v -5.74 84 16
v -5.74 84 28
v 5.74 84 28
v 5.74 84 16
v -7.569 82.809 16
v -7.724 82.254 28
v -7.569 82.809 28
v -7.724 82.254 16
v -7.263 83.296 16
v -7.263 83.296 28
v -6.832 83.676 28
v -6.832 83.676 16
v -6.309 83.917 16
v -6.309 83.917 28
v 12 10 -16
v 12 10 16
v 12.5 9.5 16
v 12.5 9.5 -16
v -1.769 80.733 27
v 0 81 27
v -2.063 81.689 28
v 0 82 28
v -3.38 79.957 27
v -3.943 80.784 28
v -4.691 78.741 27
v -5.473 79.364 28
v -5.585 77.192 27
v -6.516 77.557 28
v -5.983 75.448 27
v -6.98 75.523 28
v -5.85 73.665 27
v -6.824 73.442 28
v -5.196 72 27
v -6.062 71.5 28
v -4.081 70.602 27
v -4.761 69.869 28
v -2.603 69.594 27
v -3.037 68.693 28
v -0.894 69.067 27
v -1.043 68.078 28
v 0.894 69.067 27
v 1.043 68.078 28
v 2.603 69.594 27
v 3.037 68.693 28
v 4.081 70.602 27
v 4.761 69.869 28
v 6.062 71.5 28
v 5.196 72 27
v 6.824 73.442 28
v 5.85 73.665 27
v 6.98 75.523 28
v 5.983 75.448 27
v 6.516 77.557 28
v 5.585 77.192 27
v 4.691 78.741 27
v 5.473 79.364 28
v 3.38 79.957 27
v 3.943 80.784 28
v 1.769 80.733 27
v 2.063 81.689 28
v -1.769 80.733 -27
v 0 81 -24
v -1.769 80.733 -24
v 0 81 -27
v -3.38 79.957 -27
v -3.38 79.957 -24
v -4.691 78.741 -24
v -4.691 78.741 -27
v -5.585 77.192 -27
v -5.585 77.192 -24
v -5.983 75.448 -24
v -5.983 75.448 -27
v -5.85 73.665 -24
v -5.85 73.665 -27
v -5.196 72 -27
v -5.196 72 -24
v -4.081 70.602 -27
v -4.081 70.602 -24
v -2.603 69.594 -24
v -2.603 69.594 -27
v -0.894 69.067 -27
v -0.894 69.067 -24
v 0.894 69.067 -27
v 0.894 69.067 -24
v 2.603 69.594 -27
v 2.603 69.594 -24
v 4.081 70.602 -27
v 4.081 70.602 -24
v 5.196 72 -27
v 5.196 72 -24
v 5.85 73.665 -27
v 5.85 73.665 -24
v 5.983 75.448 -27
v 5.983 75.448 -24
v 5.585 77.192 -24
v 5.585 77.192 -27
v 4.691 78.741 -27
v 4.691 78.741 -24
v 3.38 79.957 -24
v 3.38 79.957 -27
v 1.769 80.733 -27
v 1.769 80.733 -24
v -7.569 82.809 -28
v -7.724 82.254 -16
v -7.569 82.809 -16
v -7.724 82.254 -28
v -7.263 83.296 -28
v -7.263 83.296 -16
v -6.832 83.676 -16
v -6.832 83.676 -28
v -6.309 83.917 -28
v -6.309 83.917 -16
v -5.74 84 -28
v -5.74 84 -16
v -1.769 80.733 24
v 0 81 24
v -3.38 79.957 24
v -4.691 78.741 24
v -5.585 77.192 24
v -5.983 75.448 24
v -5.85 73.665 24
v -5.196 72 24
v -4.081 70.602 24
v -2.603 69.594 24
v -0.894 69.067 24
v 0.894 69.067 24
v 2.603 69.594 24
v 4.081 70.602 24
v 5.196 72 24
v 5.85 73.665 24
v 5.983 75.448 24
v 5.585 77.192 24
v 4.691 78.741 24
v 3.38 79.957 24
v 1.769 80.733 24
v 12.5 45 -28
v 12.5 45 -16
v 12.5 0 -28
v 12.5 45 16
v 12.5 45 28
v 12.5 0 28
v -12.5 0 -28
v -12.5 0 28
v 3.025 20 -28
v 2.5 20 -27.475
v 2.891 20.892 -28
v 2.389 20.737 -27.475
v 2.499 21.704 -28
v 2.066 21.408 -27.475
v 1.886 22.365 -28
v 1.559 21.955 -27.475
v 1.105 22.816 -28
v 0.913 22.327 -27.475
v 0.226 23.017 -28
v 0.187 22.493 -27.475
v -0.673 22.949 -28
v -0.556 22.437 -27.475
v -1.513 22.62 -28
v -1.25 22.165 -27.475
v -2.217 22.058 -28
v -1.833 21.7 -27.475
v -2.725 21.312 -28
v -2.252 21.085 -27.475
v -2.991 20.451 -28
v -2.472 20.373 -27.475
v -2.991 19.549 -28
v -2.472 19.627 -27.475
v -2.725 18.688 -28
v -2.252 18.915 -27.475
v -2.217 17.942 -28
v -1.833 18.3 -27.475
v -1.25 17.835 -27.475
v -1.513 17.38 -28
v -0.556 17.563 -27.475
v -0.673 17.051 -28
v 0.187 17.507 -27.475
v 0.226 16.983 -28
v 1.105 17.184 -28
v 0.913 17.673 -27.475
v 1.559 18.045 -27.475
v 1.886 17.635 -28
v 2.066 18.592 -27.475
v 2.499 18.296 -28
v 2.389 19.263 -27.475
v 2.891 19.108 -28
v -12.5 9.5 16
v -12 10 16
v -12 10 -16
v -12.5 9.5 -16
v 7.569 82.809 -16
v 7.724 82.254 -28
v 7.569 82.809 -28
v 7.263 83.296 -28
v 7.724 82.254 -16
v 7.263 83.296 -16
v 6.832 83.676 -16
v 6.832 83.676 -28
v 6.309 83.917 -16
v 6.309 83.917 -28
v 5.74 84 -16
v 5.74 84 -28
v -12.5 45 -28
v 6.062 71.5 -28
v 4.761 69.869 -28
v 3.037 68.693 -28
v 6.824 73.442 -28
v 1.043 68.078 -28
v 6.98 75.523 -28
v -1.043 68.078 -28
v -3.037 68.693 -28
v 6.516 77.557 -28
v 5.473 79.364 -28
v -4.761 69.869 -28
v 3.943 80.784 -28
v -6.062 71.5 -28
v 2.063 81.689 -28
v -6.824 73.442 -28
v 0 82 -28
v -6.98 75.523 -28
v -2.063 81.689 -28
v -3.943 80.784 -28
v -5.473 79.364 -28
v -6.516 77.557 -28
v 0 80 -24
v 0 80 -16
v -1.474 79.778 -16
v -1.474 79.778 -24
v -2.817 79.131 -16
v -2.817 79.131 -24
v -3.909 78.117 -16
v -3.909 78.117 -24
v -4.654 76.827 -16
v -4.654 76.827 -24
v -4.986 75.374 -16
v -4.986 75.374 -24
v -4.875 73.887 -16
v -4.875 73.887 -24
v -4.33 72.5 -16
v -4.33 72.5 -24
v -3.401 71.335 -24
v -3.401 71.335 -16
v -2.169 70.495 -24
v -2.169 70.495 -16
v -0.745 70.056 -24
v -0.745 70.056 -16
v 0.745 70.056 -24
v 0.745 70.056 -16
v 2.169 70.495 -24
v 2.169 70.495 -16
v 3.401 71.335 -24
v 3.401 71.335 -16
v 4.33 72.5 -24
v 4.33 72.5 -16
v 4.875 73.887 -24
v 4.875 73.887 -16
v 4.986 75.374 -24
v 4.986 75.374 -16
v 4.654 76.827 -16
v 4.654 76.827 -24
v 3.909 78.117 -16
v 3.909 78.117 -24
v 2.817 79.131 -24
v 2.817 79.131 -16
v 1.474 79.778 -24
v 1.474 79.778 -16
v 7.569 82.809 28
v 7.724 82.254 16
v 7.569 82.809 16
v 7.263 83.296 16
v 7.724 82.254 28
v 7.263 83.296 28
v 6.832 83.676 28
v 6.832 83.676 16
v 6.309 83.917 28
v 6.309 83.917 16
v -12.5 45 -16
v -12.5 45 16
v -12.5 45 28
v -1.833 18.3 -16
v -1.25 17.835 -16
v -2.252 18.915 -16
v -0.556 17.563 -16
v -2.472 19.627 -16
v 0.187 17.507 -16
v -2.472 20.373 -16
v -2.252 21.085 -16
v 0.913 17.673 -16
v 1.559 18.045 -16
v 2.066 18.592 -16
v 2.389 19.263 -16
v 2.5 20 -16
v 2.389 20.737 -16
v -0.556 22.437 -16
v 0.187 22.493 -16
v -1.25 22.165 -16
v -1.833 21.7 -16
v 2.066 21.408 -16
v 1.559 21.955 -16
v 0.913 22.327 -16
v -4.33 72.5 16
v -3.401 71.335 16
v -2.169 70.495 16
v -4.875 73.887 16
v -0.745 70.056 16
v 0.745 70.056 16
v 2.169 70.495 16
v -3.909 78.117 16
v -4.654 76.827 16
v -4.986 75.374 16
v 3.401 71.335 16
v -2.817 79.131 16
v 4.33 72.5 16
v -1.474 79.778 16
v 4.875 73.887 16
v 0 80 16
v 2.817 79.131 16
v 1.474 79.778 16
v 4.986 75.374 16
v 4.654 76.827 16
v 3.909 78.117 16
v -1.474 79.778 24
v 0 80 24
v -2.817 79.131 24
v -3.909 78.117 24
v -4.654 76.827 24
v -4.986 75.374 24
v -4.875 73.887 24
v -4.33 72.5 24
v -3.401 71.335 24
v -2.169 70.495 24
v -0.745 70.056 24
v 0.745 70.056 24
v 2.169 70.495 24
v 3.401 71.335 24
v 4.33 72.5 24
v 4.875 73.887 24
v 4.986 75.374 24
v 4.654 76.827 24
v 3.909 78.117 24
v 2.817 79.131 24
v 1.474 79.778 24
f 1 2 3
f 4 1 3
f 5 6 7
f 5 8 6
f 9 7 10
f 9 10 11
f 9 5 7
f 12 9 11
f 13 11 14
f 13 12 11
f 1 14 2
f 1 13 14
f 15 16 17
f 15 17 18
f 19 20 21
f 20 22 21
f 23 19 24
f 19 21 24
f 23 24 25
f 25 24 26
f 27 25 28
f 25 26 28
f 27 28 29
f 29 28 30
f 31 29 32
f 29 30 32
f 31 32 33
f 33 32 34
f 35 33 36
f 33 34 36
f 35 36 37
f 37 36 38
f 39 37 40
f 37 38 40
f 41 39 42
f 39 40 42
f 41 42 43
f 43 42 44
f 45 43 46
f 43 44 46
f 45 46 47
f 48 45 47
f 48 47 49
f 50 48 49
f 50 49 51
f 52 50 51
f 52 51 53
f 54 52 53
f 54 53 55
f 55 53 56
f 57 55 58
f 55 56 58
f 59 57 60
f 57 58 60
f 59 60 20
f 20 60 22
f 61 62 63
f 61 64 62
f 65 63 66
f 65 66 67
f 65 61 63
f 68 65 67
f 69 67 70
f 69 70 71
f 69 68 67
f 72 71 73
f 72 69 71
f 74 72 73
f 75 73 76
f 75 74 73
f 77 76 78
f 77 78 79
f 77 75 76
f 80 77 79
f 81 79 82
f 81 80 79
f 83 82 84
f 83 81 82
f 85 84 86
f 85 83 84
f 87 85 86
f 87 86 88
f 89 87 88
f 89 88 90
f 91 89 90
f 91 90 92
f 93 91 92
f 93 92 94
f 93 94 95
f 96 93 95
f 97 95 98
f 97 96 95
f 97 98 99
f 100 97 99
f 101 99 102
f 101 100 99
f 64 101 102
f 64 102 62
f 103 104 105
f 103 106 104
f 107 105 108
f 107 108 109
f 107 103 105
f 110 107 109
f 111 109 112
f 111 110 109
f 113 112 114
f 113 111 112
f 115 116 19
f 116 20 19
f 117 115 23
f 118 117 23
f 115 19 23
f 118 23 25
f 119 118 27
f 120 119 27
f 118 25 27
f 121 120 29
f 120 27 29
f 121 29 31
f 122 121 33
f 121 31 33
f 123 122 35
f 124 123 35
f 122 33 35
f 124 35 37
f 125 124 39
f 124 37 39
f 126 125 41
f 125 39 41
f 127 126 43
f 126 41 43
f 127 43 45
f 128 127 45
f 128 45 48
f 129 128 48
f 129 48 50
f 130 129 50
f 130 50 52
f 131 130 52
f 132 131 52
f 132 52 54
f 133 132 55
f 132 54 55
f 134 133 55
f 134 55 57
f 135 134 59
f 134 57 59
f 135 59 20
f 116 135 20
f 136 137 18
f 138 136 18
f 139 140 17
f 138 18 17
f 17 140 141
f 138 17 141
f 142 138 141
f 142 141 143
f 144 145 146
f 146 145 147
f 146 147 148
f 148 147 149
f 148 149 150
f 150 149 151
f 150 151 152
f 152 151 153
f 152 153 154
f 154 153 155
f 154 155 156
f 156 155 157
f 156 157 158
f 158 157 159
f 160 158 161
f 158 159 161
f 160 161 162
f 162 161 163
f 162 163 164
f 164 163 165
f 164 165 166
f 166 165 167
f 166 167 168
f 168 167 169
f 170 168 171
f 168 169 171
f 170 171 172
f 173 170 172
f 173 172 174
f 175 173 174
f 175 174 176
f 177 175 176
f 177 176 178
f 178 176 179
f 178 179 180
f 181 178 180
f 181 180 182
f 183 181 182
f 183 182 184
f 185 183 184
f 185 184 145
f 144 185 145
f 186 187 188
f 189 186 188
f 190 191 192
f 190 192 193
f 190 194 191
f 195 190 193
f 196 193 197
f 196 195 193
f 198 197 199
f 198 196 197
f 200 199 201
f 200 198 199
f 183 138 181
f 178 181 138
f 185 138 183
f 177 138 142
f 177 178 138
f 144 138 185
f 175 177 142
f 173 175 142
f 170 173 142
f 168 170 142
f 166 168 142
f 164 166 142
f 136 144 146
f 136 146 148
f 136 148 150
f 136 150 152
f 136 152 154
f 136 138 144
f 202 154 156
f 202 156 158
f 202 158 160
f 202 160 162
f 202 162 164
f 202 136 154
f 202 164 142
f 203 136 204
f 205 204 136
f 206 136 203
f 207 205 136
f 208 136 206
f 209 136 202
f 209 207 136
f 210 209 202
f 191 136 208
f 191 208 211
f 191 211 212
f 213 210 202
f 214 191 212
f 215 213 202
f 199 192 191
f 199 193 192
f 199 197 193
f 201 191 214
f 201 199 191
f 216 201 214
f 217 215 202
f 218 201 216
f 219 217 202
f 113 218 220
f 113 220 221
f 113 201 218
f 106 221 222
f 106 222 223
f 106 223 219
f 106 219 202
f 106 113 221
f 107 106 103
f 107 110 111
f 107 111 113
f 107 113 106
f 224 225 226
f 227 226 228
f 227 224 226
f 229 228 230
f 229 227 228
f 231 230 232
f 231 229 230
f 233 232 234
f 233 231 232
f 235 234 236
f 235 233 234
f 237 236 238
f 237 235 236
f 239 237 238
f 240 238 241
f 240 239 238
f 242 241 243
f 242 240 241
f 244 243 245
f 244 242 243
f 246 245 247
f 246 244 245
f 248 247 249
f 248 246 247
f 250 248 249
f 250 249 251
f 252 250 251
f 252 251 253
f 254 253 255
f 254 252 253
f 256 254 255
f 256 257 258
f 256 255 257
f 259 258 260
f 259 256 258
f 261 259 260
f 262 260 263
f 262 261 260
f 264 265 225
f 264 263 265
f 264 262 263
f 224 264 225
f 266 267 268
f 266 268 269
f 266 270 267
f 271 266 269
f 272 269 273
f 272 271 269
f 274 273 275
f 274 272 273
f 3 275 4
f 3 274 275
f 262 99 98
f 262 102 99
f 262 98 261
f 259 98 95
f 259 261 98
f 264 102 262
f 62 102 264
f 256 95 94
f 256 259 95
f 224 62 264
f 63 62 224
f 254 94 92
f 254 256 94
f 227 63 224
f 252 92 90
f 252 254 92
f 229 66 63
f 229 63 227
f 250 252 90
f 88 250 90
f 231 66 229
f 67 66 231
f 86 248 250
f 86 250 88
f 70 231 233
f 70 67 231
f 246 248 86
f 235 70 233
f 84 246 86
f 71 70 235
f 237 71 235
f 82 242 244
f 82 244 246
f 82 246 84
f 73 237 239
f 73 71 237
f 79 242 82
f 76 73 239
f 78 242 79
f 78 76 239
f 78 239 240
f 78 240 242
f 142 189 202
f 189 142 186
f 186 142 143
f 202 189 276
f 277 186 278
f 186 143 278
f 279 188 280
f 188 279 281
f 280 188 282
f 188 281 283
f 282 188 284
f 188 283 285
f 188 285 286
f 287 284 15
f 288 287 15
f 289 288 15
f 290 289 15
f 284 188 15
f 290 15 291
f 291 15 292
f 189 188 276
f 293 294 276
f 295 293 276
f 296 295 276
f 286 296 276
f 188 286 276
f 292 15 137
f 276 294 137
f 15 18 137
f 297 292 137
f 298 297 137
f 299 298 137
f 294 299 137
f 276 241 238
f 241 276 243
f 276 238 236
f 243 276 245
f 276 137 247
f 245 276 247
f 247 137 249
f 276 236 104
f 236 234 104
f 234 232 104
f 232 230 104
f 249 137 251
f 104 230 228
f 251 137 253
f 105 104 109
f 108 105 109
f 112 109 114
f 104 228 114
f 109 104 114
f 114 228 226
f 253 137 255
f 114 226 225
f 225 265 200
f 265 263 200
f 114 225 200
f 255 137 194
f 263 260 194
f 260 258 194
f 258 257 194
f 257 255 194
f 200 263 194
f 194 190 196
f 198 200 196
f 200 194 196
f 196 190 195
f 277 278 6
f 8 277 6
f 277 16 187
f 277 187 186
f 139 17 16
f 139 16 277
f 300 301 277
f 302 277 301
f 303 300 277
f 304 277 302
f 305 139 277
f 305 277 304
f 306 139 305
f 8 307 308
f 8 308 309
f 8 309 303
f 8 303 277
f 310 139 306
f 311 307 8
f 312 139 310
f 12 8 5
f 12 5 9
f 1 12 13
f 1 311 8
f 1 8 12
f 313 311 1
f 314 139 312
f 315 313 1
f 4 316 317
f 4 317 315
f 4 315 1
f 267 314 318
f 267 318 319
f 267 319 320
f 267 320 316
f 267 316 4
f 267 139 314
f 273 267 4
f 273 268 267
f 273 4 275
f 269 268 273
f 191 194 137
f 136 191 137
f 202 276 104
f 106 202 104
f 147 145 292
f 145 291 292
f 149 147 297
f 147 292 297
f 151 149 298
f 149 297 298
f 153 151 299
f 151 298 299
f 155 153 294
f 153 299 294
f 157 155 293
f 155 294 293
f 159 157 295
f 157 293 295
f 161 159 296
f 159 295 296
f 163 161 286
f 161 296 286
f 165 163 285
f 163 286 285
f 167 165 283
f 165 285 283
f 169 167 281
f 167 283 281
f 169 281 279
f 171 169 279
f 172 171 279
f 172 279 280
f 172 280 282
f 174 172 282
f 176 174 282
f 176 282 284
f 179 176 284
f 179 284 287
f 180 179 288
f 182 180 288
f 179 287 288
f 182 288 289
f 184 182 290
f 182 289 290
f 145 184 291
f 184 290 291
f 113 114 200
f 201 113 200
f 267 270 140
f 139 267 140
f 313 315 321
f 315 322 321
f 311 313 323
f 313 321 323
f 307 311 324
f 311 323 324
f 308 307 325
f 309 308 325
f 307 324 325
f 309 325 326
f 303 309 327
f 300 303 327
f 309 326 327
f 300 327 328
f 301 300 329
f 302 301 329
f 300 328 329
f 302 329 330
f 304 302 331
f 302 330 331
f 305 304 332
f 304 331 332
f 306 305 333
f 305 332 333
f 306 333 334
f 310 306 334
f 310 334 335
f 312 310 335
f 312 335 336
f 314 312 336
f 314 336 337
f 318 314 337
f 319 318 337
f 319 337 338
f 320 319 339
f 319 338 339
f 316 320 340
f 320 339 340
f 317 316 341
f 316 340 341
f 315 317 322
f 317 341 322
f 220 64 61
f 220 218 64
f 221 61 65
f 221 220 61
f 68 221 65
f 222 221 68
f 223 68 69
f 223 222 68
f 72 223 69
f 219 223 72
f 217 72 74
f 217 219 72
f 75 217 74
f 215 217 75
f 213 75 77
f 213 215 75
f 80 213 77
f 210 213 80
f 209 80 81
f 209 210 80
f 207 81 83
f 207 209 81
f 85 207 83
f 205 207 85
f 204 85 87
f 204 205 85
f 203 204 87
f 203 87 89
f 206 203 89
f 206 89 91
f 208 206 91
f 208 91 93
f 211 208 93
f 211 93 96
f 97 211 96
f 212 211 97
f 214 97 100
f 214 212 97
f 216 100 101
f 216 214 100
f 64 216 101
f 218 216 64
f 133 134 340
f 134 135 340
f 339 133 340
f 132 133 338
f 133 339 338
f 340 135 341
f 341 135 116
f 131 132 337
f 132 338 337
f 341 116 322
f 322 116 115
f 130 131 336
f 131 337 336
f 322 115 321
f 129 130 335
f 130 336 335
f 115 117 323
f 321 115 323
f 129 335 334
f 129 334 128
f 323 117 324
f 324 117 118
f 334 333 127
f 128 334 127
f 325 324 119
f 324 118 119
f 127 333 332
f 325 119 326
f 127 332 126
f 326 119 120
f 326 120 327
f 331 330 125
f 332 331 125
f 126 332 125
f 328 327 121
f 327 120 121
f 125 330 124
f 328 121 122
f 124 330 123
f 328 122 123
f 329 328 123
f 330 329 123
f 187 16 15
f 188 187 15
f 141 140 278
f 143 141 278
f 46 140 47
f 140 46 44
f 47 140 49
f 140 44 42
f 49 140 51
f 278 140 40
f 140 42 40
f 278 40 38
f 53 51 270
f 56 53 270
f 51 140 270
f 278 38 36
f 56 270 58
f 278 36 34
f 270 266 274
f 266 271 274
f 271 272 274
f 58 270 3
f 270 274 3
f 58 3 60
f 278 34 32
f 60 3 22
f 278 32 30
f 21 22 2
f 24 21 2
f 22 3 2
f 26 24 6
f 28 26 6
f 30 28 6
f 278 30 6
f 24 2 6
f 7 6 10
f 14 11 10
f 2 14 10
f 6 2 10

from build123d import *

# Parameters (mm, degrees)
BOSS_EXTRUDE1_DEPTH         = 28
SKETCH2_W                   = 32
SKETCH2_H                   = 74
CUT_EXTRUDE1_DEPTH          = 56
FILLET1_R                   = 2
CHAMFER1_SIZE               = 0.5
M6_TAPPED_HOLE2_D           = 5
M6_TAPPED_HOLE2_DEPTH       = 27
M6_TAPPED_HOLE2_CSINK_D     = 6.05
M6_TAPPED_HOLE2_CSINK_ANGLE = 90
M6_TAPPED_HOLE2_TIP         = 1.502151548


with BuildPart() as part:
    # Sketch1 → Boss-Extrude1 (new, symmetric)
    with BuildSketch(Plane.XY):
        Polygon((12.5, 0), (-12.5, 0), (-12.5, 45), (-7.5, 84), (7.5, 84), (12.5, 45), align=None)
    extrude(amount=BOSS_EXTRUDE1_DEPTH, both=True)

    # Sketch2 → Cut-Extrude1 (cut)
    with BuildSketch(Plane(origin=(12.5, 0, 0), x_dir=(0, 0, -1), z_dir=(1, 0, 0))):
        with Locations((0, 47)):
            Rectangle(SKETCH2_W, SKETCH2_H)
    extrude(amount=-CUT_EXTRUDE1_DEPTH, mode=Mode.SUBTRACT)

    # Sketch4 → CBORE for M4 Hex Socket Head Cap Screw1 (revolve, cut)
    with BuildSketch(Plane(origin=(0, 75, -28), x_dir=(0, 1, 0), z_dir=(1, 0, 0))):
        Polygon((0, 0), (0, 23.004303095), (5, 20), (5, 4), (6, 4), (6, 1), (7, 0), align=None)
    cbore_for_m4_hex_socket_head_cap_screw1 = revolve(axis=Axis((0, 75, -34.35), (0, 0, 1)), mode=Mode.SUBTRACT)

    # Mirror1: CBORE for M4 Hex Socket Head Cap Screw1 across plane
    add(cbore_for_m4_hex_socket_head_cap_screw1.mirror(Plane.XY), mode=Mode.SUBTRACT)

    # Fillet1
    fillet1_edges = [part.edges().sort_by_distance(p)[0] for p in [
        (-7.5, 84, 22),
        (7.5, 84, 22),
        (-7.5, 84, -22),
        (7.5, 84, -22),
    ]]
    fillet(fillet1_edges, radius=FILLET1_R)

    # Chamfer1
    chamfer1_edges = [part.edges().sort_by_distance(p)[0] for p in [
        (-12.5, 10, 0),
        (12.5, 10, 0),
    ]]
    chamfer(chamfer1_edges, length=CHAMFER1_SIZE)

    # M6 Tapped Hole2
    with Locations(Plane(origin=(0, 0, -28), x_dir=(-1, 0, 0), z_dir=(0, 0, -1))):
        with Locations((0, 20)):
            CounterSinkHole(M6_TAPPED_HOLE2_D / 2, M6_TAPPED_HOLE2_CSINK_D / 2, depth=M6_TAPPED_HOLE2_DEPTH, counter_sink_angle=M6_TAPPED_HOLE2_CSINK_ANGLE)
            with Locations((0, 0, -(M6_TAPPED_HOLE2_DEPTH + M6_TAPPED_HOLE2_TIP / 2))):  # 118° drill point
                Cone(0, M6_TAPPED_HOLE2_D / 2, M6_TAPPED_HOLE2_TIP, mode=Mode.SUBTRACT)


solid = part.part
